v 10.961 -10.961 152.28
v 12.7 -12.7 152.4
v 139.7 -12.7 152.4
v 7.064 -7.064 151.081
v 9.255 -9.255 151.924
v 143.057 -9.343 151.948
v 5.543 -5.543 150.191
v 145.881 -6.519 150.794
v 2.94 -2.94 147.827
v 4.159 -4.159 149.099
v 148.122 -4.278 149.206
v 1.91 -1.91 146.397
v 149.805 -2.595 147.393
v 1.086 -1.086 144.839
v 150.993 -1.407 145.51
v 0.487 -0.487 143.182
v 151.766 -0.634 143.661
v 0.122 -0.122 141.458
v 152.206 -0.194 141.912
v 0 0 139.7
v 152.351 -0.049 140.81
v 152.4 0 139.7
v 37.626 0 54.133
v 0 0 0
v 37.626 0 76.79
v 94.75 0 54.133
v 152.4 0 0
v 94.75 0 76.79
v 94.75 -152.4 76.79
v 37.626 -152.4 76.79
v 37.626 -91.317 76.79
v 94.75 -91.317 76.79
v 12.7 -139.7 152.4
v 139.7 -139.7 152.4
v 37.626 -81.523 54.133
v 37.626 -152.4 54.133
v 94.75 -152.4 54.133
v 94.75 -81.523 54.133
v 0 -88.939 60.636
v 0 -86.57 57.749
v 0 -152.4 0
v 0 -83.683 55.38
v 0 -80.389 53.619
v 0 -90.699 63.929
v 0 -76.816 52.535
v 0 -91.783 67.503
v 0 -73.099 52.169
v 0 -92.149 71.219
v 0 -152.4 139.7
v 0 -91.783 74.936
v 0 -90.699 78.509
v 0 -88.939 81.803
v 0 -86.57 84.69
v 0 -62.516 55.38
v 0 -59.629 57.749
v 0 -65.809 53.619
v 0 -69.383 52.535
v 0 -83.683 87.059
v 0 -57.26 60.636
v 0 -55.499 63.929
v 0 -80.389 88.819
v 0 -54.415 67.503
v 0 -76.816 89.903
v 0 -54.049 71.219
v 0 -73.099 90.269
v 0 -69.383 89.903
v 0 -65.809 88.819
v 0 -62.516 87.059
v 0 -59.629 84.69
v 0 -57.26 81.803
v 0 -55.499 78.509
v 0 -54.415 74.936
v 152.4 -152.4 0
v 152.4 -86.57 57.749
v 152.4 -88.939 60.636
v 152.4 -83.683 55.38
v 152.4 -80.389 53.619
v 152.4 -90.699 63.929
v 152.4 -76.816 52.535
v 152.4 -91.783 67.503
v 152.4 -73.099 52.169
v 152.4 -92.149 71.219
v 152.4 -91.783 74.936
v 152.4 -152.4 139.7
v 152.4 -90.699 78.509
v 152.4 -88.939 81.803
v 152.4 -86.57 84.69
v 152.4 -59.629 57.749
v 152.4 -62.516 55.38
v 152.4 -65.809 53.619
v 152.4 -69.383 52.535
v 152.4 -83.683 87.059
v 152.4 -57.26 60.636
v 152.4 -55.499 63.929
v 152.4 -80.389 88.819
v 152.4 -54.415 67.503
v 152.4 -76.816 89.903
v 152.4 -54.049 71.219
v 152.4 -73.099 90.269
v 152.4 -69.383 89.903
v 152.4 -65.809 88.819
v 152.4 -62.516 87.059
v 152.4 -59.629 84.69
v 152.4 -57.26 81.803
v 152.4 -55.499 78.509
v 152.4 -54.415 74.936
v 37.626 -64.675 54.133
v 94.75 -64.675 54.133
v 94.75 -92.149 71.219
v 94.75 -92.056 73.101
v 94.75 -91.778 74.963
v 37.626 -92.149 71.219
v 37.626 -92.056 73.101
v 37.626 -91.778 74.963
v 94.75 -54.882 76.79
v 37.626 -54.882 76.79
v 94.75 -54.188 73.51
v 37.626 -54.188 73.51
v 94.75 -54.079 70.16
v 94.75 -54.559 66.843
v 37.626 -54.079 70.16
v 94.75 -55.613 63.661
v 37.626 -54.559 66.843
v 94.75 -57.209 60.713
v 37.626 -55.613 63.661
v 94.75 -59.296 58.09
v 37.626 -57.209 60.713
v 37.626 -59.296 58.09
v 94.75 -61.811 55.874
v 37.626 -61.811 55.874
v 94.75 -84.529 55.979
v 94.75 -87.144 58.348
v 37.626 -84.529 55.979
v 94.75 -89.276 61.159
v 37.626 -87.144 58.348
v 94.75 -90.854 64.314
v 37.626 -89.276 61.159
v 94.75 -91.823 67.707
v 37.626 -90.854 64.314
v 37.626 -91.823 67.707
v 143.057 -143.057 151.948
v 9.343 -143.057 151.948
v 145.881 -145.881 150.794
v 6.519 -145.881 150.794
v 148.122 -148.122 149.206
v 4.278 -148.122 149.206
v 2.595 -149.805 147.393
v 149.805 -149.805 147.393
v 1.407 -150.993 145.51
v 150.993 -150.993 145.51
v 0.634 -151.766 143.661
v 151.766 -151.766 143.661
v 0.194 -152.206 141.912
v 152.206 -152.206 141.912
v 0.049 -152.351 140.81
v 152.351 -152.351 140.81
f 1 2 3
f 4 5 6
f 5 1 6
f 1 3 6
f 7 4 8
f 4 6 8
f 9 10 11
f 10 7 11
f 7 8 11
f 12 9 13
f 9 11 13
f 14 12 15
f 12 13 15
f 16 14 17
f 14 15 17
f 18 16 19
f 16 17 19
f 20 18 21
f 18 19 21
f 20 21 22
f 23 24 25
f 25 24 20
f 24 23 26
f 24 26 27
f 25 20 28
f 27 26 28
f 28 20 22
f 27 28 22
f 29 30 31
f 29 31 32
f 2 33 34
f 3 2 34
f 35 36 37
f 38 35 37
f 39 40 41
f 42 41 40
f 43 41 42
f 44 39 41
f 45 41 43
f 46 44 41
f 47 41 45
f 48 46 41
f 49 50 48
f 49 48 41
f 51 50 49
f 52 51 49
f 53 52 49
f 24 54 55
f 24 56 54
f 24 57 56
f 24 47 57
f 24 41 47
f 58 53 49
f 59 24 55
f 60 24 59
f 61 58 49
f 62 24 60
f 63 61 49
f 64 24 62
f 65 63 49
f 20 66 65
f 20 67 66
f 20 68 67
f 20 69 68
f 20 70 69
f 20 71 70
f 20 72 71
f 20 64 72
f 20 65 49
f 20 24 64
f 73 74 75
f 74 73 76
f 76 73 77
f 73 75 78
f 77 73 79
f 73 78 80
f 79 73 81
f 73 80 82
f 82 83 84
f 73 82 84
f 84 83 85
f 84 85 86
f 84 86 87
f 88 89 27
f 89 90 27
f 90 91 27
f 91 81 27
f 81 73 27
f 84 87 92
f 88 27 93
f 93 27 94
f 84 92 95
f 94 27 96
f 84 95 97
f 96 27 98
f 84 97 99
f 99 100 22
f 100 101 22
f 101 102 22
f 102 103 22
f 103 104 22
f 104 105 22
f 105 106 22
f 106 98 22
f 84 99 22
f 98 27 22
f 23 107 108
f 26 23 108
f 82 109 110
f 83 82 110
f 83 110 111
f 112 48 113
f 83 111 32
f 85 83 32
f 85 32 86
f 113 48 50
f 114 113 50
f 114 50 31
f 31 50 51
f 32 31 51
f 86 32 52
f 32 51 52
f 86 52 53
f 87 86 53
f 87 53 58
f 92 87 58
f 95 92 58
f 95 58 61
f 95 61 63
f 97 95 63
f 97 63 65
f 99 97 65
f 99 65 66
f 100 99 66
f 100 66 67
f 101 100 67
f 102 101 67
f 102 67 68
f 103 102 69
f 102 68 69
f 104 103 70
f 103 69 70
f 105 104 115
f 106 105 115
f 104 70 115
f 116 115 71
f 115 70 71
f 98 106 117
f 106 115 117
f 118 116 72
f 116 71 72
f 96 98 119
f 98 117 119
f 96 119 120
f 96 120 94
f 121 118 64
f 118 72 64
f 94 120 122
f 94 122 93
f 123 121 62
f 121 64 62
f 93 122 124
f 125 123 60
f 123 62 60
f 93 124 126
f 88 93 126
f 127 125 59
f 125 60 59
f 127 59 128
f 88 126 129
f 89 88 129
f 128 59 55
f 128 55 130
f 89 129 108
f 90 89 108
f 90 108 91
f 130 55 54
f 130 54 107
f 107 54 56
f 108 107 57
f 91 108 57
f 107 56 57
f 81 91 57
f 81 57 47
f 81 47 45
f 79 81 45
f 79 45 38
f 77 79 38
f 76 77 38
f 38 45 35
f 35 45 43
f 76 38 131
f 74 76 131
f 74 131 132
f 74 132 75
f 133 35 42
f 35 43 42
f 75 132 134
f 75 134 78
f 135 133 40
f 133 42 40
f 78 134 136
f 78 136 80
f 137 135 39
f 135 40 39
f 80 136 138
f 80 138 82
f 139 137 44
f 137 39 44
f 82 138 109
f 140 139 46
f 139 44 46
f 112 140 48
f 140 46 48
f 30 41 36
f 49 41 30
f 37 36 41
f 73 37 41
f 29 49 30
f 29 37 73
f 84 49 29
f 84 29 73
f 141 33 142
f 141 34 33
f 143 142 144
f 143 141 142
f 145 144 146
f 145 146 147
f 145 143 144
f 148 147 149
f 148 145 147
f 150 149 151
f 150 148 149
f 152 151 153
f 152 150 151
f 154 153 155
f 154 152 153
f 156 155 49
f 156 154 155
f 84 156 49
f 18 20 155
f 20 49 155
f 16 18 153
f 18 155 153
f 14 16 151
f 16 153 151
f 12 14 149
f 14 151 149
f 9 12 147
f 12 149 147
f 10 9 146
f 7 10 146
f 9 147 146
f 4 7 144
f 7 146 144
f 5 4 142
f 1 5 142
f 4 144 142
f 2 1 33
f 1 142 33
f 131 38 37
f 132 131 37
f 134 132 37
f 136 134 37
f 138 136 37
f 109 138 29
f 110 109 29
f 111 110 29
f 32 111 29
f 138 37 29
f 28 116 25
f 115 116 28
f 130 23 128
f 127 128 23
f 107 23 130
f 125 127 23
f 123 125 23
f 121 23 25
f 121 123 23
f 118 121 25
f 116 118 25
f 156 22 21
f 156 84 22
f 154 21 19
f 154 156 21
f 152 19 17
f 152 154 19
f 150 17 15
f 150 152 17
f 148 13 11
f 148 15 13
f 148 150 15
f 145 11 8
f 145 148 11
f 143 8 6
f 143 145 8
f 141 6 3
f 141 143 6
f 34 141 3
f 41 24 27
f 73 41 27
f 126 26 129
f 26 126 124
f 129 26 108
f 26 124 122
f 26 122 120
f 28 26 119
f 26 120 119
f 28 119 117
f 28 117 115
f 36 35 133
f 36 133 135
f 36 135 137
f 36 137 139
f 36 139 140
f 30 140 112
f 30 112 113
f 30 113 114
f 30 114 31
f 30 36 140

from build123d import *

# Parameters (mm, degrees)
F0_W     = 152.4
F0_H     = 152.4
F1_DEPTH = 152.4
F2_R     = 12.7
F4_D     = 38.1
F5_W     = 57.1246
F5_H     = 22.6568
F6_DEPTH = 152.401


with BuildPart() as f1:
    # F0 (on Front) → F1 (new body)
    with BuildSketch(Plane.XZ):
        with Locations((76.2, 76.2)):
            Rectangle(F0_W, F0_H)
    extrude(amount=F1_DEPTH)

    # F2
    f2_edges = [f1.edges().sort_by_distance(p)[0] for p in [
        (76.2, -152.4, 152.4),
        (0, -76.2, 152.4),
        (76.2, 0, 152.4),
        (152.4, -76.2, 152.4),
    ]]
    fillet(f2_edges, radius=F2_R)

    # F4 (through all)
    with Locations(Plane.YZ.offset(152.4)):
        with Locations((-73.099315, 71.219265)):
            Hole(F4_D / 2)

    # F5 (on face) → F6 (cut, through all)
    with BuildSketch(Plane.XZ.offset(152.4)):
        with Locations((66.187836, 65.461391)):
            Rectangle(F5_W, F5_H)
    extrude(amount=-F6_DEPTH, mode=Mode.SUBTRACT)


solid = f1.part
